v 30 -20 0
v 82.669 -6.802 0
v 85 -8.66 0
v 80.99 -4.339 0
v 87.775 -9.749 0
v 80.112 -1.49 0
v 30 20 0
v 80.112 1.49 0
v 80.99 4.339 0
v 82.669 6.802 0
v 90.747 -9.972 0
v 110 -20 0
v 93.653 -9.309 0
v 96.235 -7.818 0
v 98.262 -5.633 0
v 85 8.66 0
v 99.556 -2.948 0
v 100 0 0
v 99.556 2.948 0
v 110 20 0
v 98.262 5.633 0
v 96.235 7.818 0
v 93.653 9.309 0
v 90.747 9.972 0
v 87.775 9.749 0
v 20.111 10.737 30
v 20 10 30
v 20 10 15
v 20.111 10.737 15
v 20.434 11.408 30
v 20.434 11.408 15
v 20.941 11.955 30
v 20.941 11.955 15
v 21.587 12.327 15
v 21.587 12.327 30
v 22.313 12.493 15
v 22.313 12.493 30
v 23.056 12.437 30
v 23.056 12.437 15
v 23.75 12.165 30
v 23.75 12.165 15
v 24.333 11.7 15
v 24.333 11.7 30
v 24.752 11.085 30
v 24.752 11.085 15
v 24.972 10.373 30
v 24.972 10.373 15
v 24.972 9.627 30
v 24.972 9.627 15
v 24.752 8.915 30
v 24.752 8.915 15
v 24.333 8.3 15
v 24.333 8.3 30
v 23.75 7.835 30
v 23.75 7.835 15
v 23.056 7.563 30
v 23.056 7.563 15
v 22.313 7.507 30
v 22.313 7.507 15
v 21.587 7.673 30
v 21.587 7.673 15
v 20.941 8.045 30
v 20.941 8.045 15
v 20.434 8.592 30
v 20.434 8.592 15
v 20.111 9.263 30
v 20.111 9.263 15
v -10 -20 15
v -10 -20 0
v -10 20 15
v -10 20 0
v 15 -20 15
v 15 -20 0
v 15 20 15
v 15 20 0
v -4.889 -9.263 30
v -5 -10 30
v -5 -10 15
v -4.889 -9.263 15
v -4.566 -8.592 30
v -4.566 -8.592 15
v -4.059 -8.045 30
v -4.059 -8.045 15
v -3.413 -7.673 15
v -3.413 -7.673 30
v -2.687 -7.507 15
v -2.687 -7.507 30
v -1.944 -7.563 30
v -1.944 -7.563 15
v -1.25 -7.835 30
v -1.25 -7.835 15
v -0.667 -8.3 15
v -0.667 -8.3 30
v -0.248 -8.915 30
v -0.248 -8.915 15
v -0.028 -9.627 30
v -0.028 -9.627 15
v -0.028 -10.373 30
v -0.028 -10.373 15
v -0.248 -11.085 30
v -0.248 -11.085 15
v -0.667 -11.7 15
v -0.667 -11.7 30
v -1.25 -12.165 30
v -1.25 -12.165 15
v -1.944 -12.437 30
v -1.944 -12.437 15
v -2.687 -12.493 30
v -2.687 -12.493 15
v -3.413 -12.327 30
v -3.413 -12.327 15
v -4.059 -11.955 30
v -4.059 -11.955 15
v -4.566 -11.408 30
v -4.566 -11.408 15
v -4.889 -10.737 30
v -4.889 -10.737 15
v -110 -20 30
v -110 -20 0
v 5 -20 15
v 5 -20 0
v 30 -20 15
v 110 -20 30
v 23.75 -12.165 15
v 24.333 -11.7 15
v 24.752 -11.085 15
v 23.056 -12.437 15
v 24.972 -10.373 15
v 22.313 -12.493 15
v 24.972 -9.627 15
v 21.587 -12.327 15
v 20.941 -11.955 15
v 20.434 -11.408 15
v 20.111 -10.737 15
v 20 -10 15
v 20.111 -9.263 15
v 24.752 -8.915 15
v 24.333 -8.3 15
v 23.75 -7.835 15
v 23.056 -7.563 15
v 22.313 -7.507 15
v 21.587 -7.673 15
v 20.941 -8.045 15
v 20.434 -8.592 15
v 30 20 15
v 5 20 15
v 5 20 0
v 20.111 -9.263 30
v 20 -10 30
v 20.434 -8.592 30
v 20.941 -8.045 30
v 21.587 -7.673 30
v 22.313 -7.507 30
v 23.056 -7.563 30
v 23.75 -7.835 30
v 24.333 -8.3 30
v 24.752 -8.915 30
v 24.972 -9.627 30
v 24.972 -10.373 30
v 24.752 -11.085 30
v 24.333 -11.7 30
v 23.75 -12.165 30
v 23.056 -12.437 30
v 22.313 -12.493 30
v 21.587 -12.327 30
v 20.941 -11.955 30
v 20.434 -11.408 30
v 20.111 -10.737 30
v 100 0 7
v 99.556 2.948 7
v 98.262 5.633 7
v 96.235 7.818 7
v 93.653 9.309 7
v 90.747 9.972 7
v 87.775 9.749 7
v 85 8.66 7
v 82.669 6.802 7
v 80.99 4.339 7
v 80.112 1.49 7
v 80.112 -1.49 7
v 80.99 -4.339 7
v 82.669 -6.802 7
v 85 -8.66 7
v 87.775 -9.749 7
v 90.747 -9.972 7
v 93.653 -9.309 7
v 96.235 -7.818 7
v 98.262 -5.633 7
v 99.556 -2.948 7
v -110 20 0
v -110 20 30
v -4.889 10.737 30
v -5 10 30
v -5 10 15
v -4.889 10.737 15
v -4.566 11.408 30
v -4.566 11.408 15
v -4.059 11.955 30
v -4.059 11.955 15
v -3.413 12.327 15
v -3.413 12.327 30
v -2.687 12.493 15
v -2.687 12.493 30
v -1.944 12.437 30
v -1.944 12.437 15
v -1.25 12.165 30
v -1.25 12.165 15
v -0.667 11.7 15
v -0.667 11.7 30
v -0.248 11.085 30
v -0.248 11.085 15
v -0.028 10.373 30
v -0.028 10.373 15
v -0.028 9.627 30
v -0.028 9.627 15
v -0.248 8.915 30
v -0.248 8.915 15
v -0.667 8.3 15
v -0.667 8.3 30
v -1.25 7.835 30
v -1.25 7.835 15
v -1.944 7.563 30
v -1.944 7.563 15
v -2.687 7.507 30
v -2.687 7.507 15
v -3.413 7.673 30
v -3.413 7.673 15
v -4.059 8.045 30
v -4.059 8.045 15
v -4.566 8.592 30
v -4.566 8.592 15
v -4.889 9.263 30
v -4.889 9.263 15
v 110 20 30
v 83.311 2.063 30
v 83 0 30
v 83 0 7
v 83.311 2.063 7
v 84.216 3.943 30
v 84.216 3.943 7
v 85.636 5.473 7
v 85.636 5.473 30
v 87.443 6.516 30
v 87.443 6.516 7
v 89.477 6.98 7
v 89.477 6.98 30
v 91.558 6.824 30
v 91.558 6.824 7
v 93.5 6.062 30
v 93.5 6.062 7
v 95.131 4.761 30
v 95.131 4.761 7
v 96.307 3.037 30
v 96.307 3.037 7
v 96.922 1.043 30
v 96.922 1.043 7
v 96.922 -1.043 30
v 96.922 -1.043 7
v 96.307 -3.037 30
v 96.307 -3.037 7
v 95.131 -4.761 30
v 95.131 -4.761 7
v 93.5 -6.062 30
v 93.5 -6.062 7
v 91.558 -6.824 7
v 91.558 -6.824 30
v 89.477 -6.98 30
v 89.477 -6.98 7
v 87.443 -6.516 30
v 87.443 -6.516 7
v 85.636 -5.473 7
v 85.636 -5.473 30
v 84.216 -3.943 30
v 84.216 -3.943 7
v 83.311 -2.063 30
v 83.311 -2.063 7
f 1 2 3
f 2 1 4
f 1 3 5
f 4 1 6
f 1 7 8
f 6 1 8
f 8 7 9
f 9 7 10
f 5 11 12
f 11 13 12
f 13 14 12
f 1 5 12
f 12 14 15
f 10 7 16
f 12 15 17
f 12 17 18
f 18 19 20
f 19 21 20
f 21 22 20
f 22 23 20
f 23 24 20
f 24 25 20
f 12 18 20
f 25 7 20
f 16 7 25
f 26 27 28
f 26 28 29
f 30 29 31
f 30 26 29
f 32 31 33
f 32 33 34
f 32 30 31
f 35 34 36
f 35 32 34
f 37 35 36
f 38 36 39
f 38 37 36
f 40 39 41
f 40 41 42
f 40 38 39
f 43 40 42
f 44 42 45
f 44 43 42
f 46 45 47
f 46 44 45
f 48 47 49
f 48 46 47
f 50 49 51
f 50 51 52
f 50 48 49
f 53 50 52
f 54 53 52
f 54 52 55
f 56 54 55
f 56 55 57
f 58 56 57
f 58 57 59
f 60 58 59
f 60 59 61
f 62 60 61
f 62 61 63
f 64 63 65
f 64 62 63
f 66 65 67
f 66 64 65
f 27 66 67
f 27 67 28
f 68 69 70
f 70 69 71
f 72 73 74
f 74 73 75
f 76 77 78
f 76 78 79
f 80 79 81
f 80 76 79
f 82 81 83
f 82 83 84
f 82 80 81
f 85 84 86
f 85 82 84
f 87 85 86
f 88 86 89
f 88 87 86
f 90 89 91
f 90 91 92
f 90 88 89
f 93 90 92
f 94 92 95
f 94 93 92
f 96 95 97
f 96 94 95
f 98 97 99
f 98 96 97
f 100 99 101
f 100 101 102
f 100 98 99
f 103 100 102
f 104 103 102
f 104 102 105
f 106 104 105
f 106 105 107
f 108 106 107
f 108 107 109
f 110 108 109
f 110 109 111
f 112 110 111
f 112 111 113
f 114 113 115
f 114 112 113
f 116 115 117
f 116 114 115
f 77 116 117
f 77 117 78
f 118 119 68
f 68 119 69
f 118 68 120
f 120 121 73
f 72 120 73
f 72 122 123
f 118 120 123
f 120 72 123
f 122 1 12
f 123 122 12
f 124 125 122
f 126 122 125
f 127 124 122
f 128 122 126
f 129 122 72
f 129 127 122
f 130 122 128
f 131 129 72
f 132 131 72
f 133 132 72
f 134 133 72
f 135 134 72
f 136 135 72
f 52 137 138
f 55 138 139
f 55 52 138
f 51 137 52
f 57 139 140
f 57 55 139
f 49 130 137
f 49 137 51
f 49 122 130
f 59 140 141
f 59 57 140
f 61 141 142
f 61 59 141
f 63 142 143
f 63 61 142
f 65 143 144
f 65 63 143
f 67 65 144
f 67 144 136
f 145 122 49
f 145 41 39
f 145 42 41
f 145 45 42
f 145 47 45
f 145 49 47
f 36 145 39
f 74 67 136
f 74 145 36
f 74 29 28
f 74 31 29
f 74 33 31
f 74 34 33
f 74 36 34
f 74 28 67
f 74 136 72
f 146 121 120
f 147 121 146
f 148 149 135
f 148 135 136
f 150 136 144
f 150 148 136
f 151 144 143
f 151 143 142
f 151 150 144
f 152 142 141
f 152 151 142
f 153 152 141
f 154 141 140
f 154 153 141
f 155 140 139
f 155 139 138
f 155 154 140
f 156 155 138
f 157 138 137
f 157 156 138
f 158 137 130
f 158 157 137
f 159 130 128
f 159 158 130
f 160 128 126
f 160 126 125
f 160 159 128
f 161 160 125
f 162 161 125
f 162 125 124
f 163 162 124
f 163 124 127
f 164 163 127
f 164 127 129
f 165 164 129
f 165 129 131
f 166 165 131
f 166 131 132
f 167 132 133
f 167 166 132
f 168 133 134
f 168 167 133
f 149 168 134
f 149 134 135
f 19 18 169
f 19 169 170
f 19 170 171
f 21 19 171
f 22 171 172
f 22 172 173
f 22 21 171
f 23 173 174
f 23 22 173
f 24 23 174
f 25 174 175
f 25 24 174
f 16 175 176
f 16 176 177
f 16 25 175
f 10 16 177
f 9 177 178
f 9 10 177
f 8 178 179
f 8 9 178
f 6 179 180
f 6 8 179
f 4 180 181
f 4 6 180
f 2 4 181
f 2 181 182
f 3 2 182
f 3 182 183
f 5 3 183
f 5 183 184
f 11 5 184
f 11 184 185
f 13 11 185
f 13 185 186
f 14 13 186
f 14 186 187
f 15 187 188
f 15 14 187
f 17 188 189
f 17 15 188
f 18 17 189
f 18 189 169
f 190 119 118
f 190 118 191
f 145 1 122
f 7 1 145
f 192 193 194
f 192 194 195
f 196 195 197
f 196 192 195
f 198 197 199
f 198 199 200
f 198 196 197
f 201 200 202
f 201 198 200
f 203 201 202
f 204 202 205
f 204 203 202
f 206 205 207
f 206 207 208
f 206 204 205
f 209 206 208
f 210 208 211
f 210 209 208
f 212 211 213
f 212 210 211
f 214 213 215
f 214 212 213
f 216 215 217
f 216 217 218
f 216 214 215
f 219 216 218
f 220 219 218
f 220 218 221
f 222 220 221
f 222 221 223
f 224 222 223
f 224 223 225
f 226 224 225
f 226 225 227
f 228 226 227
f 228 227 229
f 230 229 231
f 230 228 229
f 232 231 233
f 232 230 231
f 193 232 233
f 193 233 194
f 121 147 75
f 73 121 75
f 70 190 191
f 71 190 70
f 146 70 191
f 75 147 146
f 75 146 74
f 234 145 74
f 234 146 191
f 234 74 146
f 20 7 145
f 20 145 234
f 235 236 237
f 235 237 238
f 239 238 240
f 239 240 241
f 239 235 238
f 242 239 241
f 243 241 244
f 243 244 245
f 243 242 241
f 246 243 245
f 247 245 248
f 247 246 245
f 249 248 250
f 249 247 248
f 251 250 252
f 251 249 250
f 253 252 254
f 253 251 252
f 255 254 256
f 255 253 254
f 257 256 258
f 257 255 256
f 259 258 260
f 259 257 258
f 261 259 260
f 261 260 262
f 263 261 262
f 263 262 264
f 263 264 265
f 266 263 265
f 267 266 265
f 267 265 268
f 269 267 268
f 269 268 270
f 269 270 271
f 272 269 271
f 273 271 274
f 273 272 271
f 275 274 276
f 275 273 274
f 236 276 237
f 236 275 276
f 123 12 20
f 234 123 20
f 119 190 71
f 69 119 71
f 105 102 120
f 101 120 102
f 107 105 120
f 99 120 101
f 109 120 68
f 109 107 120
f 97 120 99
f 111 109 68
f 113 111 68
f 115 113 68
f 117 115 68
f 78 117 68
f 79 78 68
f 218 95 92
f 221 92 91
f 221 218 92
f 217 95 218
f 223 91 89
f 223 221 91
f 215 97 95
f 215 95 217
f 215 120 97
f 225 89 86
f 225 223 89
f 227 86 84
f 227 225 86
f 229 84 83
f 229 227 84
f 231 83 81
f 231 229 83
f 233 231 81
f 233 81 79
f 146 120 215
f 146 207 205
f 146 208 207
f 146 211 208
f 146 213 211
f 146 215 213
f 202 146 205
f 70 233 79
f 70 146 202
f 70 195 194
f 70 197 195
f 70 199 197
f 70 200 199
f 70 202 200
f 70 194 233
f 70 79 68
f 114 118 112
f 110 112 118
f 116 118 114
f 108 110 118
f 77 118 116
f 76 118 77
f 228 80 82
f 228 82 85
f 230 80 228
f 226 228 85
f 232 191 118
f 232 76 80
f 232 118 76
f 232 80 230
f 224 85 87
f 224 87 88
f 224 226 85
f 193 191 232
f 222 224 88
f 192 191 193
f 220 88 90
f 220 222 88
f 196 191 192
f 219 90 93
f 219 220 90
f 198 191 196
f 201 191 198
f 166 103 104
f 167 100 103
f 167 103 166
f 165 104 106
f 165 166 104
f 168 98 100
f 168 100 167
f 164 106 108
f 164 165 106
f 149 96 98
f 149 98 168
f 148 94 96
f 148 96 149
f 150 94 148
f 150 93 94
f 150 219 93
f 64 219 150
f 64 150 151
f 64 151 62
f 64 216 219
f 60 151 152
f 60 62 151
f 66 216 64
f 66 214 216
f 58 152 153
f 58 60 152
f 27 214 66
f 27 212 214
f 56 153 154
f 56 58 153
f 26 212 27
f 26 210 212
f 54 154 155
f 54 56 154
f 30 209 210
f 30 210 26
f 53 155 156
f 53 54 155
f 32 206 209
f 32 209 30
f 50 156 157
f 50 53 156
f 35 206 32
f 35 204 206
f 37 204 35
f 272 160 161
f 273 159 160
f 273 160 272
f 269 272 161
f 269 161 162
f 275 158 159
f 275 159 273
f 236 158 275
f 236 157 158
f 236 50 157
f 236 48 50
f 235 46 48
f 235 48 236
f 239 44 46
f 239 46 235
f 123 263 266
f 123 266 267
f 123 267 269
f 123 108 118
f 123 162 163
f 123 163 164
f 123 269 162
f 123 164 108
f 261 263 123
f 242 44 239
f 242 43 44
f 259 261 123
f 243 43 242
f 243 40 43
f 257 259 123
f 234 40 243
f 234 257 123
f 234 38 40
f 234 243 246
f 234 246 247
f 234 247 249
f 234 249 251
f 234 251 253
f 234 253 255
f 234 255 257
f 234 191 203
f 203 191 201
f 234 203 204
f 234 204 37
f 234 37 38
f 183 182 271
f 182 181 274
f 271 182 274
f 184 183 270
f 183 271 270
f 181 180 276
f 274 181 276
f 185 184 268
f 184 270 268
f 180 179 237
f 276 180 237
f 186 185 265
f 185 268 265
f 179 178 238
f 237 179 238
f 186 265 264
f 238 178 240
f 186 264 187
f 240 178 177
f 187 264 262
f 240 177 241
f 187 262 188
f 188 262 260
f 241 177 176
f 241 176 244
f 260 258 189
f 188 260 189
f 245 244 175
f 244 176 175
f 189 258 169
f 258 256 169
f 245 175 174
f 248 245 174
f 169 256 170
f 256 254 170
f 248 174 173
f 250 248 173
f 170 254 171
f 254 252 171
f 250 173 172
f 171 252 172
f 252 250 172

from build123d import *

# Parameters (mm, degrees)
SKETCH1_W           = 220
SKETCH1_H           = 40
BOSS_EXTRUDE1_DEPTH = 30
SKETCH2_R           = 10
CUT_EXTRUDE1_DEPTH  = 7
CUT_EXTRUDE2_START  = -30
SKETCH3_R           = 7
CUT_EXTRUDE2_DEPTH  = 23
SKETCH4_W           = 15
SKETCH4_H           = 40
CUT_EXTRUDE3_DEPTH  = 15
CUT_EXTRUDE4_START  = -30
SKETCH5_R           = 2.5
CUT_EXTRUDE4_DEPTH  = 15


with BuildPart() as part:
    # Sketch1 → Boss-Extrude1 (new body)
    with BuildSketch(Plane.XY):
        Rectangle(SKETCH1_W, SKETCH1_H)
    extrude(amount=BOSS_EXTRUDE1_DEPTH)

    # Sketch2 → Cut-Extrude1 (cut)
    with BuildSketch(Plane.XY):
        with Locations((90, 0)):
            Circle(SKETCH2_R)
    extrude(amount=CUT_EXTRUDE1_DEPTH, mode=Mode.SUBTRACT)

    # Sketch3 → Cut-Extrude2 (cut)
    with BuildSketch(Plane(origin=(0, 0, 0), x_dir=(-1, 0, 0), z_dir=(0, 0, -1)).offset(CUT_EXTRUDE2_START)):
        with Locations((-90, 0)):
            Circle(SKETCH3_R)
    extrude(amount=CUT_EXTRUDE2_DEPTH, mode=Mode.SUBTRACT)

    # Sketch4 → Cut-Extrude3 (cut)
    with BuildSketch(Plane(origin=(0, 0, 0), x_dir=(-1, 0, 0), z_dir=(0, 0, -1))):
        with Locations((-22.5, 0)):
            Rectangle(SKETCH4_W, SKETCH4_H)
        with Locations((2.5, 0)):
            Rectangle(SKETCH4_W, SKETCH4_H)
    extrude(amount=-CUT_EXTRUDE3_DEPTH, mode=Mode.SUBTRACT)

    # Sketch5 → Cut-Extrude4 (cut)
    with BuildSketch(Plane(origin=(0, 0, 0), x_dir=(-1, 0, 0), z_dir=(0, 0, -1)).offset(CUT_EXTRUDE4_START)):
        with Locations((-22.5, 10)):
            Circle(SKETCH5_R)
        with Locations((-22.5, -10)):
            Circle(SKETCH5_R)
        with Locations((2.5, -10)):
            Circle(SKETCH5_R)
        with Locations((2.5, 10)):
            Circle(SKETCH5_R)
    extrude(amount=CUT_EXTRUDE4_DEPTH, mode=Mode.SUBTRACT)


solid = part.part
